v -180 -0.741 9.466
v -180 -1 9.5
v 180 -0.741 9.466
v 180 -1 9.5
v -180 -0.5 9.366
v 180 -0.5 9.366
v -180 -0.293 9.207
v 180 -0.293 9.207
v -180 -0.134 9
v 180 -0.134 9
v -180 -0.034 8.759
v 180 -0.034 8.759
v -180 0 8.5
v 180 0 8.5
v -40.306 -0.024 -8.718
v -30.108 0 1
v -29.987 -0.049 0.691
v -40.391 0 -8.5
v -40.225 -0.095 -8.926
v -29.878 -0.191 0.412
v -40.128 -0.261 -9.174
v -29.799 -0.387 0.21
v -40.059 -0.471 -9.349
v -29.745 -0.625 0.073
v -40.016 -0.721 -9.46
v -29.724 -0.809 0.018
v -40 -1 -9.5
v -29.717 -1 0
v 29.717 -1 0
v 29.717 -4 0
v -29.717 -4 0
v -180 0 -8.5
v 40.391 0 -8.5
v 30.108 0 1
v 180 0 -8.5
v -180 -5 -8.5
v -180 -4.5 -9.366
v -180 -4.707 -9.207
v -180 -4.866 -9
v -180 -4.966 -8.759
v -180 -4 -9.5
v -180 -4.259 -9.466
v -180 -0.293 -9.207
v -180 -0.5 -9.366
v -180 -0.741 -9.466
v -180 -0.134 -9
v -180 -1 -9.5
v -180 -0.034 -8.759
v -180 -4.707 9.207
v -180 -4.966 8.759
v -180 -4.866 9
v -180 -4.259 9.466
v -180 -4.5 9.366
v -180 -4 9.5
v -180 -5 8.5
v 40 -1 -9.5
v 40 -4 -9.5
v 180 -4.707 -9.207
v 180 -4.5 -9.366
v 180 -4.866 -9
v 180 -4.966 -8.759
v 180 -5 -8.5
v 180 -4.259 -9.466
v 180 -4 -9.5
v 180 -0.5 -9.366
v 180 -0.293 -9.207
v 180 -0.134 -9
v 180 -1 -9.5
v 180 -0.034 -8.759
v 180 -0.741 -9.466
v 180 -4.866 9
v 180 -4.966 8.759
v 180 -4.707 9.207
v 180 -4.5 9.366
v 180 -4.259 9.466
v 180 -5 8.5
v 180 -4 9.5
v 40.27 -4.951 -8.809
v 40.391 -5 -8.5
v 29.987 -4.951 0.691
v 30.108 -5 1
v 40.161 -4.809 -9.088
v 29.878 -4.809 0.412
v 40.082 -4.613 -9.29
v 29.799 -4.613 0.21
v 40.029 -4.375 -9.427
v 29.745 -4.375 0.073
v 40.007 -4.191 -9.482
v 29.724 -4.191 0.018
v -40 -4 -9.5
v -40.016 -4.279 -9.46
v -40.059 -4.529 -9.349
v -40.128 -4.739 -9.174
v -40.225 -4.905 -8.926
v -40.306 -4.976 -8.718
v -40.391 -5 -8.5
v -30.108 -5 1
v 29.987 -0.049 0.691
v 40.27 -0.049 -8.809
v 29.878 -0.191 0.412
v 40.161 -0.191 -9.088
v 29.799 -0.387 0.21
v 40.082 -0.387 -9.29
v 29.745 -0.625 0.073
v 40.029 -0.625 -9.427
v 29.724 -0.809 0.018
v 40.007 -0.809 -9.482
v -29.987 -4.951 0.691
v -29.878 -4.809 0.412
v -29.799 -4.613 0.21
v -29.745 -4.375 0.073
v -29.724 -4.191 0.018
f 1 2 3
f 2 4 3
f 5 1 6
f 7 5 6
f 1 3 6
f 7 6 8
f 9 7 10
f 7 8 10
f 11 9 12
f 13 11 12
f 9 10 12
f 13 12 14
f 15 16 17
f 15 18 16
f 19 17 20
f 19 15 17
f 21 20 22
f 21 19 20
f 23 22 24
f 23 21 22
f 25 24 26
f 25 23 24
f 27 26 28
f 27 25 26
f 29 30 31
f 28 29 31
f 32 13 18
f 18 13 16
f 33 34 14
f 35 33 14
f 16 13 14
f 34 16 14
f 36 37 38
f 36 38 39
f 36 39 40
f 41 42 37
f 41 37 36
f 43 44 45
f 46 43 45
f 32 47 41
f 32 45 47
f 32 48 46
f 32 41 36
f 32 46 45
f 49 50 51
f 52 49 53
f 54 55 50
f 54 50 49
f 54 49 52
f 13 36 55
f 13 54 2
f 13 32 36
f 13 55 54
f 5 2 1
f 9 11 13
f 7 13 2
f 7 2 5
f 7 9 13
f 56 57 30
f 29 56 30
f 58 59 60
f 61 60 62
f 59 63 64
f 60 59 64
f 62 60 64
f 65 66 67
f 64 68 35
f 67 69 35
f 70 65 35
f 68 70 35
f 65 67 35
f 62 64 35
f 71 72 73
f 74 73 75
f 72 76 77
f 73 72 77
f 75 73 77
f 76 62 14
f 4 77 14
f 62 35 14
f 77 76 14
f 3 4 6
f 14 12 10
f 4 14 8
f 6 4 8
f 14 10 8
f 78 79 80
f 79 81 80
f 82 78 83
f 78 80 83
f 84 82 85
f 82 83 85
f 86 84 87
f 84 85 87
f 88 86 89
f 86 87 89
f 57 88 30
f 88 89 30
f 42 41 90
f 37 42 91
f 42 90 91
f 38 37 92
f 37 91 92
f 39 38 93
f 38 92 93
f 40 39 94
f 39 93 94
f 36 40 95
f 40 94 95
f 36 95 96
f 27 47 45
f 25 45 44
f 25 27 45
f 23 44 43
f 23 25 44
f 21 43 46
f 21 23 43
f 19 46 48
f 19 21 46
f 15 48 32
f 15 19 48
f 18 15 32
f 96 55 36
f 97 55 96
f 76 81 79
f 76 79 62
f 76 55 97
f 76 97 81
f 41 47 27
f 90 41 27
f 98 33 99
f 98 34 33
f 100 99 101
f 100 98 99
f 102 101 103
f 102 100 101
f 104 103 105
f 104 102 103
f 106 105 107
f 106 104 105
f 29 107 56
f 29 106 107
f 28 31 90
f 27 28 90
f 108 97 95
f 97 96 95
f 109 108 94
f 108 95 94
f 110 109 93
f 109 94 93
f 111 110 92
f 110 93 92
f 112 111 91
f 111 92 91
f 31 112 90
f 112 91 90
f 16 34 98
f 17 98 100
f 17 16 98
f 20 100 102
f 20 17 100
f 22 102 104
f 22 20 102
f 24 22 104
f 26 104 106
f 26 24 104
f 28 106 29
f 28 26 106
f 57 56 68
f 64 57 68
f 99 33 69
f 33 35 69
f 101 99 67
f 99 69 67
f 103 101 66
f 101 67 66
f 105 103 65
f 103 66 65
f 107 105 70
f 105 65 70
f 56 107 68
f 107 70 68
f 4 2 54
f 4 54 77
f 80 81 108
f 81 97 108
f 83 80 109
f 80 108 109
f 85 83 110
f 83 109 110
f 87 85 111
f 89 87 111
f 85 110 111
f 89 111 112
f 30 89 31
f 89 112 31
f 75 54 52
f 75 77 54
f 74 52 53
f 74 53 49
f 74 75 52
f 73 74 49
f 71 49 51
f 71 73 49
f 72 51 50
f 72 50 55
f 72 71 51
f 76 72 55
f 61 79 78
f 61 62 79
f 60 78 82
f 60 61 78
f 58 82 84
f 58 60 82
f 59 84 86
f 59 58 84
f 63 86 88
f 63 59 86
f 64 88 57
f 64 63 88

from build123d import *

# Parameters (mm, degrees)
F0_W     = 360
F0_H     = 19
F1_DEPTH = 5
F3_DEPTH = 25
F4_R     = 1


with BuildPart() as f1:
    # F0 (on Front) → F1 (new body)
    with BuildSketch(Plane.XZ):
        Rectangle(F0_W, F0_H)
    extrude(amount=F1_DEPTH)

    # F2 (on face) → F3 (cut)
    with BuildSketch(Plane.XZ.offset(5)):
        Polygon((-29.716518, 0), (-40, -9.5), (40, -9.5), (29.716518, 0), align=None)
    extrude(amount=-F3_DEPTH, mode=Mode.SUBTRACT)

    # F4
    f4_edges = [f1.edges().sort_by_distance(p)[0] for p in [
        (0, -5, 9.5),
        (0, 0, 9.5),
        (110, -5, -9.5),
        (-110, -5, -9.5),
        (0, -5, 0),
        (34.858259, -5, -4.75),
        (-34.858259, -5, -4.75),
        (110, 0, -9.5),
        (-110, 0, -9.5),
        (0, 0, 0),
        (-34.858259, 0, -4.75),
        (34.858259, 0, -4.75),
    ]]
    fillet(f4_edges, radius=F4_R)


solid = f1.part
